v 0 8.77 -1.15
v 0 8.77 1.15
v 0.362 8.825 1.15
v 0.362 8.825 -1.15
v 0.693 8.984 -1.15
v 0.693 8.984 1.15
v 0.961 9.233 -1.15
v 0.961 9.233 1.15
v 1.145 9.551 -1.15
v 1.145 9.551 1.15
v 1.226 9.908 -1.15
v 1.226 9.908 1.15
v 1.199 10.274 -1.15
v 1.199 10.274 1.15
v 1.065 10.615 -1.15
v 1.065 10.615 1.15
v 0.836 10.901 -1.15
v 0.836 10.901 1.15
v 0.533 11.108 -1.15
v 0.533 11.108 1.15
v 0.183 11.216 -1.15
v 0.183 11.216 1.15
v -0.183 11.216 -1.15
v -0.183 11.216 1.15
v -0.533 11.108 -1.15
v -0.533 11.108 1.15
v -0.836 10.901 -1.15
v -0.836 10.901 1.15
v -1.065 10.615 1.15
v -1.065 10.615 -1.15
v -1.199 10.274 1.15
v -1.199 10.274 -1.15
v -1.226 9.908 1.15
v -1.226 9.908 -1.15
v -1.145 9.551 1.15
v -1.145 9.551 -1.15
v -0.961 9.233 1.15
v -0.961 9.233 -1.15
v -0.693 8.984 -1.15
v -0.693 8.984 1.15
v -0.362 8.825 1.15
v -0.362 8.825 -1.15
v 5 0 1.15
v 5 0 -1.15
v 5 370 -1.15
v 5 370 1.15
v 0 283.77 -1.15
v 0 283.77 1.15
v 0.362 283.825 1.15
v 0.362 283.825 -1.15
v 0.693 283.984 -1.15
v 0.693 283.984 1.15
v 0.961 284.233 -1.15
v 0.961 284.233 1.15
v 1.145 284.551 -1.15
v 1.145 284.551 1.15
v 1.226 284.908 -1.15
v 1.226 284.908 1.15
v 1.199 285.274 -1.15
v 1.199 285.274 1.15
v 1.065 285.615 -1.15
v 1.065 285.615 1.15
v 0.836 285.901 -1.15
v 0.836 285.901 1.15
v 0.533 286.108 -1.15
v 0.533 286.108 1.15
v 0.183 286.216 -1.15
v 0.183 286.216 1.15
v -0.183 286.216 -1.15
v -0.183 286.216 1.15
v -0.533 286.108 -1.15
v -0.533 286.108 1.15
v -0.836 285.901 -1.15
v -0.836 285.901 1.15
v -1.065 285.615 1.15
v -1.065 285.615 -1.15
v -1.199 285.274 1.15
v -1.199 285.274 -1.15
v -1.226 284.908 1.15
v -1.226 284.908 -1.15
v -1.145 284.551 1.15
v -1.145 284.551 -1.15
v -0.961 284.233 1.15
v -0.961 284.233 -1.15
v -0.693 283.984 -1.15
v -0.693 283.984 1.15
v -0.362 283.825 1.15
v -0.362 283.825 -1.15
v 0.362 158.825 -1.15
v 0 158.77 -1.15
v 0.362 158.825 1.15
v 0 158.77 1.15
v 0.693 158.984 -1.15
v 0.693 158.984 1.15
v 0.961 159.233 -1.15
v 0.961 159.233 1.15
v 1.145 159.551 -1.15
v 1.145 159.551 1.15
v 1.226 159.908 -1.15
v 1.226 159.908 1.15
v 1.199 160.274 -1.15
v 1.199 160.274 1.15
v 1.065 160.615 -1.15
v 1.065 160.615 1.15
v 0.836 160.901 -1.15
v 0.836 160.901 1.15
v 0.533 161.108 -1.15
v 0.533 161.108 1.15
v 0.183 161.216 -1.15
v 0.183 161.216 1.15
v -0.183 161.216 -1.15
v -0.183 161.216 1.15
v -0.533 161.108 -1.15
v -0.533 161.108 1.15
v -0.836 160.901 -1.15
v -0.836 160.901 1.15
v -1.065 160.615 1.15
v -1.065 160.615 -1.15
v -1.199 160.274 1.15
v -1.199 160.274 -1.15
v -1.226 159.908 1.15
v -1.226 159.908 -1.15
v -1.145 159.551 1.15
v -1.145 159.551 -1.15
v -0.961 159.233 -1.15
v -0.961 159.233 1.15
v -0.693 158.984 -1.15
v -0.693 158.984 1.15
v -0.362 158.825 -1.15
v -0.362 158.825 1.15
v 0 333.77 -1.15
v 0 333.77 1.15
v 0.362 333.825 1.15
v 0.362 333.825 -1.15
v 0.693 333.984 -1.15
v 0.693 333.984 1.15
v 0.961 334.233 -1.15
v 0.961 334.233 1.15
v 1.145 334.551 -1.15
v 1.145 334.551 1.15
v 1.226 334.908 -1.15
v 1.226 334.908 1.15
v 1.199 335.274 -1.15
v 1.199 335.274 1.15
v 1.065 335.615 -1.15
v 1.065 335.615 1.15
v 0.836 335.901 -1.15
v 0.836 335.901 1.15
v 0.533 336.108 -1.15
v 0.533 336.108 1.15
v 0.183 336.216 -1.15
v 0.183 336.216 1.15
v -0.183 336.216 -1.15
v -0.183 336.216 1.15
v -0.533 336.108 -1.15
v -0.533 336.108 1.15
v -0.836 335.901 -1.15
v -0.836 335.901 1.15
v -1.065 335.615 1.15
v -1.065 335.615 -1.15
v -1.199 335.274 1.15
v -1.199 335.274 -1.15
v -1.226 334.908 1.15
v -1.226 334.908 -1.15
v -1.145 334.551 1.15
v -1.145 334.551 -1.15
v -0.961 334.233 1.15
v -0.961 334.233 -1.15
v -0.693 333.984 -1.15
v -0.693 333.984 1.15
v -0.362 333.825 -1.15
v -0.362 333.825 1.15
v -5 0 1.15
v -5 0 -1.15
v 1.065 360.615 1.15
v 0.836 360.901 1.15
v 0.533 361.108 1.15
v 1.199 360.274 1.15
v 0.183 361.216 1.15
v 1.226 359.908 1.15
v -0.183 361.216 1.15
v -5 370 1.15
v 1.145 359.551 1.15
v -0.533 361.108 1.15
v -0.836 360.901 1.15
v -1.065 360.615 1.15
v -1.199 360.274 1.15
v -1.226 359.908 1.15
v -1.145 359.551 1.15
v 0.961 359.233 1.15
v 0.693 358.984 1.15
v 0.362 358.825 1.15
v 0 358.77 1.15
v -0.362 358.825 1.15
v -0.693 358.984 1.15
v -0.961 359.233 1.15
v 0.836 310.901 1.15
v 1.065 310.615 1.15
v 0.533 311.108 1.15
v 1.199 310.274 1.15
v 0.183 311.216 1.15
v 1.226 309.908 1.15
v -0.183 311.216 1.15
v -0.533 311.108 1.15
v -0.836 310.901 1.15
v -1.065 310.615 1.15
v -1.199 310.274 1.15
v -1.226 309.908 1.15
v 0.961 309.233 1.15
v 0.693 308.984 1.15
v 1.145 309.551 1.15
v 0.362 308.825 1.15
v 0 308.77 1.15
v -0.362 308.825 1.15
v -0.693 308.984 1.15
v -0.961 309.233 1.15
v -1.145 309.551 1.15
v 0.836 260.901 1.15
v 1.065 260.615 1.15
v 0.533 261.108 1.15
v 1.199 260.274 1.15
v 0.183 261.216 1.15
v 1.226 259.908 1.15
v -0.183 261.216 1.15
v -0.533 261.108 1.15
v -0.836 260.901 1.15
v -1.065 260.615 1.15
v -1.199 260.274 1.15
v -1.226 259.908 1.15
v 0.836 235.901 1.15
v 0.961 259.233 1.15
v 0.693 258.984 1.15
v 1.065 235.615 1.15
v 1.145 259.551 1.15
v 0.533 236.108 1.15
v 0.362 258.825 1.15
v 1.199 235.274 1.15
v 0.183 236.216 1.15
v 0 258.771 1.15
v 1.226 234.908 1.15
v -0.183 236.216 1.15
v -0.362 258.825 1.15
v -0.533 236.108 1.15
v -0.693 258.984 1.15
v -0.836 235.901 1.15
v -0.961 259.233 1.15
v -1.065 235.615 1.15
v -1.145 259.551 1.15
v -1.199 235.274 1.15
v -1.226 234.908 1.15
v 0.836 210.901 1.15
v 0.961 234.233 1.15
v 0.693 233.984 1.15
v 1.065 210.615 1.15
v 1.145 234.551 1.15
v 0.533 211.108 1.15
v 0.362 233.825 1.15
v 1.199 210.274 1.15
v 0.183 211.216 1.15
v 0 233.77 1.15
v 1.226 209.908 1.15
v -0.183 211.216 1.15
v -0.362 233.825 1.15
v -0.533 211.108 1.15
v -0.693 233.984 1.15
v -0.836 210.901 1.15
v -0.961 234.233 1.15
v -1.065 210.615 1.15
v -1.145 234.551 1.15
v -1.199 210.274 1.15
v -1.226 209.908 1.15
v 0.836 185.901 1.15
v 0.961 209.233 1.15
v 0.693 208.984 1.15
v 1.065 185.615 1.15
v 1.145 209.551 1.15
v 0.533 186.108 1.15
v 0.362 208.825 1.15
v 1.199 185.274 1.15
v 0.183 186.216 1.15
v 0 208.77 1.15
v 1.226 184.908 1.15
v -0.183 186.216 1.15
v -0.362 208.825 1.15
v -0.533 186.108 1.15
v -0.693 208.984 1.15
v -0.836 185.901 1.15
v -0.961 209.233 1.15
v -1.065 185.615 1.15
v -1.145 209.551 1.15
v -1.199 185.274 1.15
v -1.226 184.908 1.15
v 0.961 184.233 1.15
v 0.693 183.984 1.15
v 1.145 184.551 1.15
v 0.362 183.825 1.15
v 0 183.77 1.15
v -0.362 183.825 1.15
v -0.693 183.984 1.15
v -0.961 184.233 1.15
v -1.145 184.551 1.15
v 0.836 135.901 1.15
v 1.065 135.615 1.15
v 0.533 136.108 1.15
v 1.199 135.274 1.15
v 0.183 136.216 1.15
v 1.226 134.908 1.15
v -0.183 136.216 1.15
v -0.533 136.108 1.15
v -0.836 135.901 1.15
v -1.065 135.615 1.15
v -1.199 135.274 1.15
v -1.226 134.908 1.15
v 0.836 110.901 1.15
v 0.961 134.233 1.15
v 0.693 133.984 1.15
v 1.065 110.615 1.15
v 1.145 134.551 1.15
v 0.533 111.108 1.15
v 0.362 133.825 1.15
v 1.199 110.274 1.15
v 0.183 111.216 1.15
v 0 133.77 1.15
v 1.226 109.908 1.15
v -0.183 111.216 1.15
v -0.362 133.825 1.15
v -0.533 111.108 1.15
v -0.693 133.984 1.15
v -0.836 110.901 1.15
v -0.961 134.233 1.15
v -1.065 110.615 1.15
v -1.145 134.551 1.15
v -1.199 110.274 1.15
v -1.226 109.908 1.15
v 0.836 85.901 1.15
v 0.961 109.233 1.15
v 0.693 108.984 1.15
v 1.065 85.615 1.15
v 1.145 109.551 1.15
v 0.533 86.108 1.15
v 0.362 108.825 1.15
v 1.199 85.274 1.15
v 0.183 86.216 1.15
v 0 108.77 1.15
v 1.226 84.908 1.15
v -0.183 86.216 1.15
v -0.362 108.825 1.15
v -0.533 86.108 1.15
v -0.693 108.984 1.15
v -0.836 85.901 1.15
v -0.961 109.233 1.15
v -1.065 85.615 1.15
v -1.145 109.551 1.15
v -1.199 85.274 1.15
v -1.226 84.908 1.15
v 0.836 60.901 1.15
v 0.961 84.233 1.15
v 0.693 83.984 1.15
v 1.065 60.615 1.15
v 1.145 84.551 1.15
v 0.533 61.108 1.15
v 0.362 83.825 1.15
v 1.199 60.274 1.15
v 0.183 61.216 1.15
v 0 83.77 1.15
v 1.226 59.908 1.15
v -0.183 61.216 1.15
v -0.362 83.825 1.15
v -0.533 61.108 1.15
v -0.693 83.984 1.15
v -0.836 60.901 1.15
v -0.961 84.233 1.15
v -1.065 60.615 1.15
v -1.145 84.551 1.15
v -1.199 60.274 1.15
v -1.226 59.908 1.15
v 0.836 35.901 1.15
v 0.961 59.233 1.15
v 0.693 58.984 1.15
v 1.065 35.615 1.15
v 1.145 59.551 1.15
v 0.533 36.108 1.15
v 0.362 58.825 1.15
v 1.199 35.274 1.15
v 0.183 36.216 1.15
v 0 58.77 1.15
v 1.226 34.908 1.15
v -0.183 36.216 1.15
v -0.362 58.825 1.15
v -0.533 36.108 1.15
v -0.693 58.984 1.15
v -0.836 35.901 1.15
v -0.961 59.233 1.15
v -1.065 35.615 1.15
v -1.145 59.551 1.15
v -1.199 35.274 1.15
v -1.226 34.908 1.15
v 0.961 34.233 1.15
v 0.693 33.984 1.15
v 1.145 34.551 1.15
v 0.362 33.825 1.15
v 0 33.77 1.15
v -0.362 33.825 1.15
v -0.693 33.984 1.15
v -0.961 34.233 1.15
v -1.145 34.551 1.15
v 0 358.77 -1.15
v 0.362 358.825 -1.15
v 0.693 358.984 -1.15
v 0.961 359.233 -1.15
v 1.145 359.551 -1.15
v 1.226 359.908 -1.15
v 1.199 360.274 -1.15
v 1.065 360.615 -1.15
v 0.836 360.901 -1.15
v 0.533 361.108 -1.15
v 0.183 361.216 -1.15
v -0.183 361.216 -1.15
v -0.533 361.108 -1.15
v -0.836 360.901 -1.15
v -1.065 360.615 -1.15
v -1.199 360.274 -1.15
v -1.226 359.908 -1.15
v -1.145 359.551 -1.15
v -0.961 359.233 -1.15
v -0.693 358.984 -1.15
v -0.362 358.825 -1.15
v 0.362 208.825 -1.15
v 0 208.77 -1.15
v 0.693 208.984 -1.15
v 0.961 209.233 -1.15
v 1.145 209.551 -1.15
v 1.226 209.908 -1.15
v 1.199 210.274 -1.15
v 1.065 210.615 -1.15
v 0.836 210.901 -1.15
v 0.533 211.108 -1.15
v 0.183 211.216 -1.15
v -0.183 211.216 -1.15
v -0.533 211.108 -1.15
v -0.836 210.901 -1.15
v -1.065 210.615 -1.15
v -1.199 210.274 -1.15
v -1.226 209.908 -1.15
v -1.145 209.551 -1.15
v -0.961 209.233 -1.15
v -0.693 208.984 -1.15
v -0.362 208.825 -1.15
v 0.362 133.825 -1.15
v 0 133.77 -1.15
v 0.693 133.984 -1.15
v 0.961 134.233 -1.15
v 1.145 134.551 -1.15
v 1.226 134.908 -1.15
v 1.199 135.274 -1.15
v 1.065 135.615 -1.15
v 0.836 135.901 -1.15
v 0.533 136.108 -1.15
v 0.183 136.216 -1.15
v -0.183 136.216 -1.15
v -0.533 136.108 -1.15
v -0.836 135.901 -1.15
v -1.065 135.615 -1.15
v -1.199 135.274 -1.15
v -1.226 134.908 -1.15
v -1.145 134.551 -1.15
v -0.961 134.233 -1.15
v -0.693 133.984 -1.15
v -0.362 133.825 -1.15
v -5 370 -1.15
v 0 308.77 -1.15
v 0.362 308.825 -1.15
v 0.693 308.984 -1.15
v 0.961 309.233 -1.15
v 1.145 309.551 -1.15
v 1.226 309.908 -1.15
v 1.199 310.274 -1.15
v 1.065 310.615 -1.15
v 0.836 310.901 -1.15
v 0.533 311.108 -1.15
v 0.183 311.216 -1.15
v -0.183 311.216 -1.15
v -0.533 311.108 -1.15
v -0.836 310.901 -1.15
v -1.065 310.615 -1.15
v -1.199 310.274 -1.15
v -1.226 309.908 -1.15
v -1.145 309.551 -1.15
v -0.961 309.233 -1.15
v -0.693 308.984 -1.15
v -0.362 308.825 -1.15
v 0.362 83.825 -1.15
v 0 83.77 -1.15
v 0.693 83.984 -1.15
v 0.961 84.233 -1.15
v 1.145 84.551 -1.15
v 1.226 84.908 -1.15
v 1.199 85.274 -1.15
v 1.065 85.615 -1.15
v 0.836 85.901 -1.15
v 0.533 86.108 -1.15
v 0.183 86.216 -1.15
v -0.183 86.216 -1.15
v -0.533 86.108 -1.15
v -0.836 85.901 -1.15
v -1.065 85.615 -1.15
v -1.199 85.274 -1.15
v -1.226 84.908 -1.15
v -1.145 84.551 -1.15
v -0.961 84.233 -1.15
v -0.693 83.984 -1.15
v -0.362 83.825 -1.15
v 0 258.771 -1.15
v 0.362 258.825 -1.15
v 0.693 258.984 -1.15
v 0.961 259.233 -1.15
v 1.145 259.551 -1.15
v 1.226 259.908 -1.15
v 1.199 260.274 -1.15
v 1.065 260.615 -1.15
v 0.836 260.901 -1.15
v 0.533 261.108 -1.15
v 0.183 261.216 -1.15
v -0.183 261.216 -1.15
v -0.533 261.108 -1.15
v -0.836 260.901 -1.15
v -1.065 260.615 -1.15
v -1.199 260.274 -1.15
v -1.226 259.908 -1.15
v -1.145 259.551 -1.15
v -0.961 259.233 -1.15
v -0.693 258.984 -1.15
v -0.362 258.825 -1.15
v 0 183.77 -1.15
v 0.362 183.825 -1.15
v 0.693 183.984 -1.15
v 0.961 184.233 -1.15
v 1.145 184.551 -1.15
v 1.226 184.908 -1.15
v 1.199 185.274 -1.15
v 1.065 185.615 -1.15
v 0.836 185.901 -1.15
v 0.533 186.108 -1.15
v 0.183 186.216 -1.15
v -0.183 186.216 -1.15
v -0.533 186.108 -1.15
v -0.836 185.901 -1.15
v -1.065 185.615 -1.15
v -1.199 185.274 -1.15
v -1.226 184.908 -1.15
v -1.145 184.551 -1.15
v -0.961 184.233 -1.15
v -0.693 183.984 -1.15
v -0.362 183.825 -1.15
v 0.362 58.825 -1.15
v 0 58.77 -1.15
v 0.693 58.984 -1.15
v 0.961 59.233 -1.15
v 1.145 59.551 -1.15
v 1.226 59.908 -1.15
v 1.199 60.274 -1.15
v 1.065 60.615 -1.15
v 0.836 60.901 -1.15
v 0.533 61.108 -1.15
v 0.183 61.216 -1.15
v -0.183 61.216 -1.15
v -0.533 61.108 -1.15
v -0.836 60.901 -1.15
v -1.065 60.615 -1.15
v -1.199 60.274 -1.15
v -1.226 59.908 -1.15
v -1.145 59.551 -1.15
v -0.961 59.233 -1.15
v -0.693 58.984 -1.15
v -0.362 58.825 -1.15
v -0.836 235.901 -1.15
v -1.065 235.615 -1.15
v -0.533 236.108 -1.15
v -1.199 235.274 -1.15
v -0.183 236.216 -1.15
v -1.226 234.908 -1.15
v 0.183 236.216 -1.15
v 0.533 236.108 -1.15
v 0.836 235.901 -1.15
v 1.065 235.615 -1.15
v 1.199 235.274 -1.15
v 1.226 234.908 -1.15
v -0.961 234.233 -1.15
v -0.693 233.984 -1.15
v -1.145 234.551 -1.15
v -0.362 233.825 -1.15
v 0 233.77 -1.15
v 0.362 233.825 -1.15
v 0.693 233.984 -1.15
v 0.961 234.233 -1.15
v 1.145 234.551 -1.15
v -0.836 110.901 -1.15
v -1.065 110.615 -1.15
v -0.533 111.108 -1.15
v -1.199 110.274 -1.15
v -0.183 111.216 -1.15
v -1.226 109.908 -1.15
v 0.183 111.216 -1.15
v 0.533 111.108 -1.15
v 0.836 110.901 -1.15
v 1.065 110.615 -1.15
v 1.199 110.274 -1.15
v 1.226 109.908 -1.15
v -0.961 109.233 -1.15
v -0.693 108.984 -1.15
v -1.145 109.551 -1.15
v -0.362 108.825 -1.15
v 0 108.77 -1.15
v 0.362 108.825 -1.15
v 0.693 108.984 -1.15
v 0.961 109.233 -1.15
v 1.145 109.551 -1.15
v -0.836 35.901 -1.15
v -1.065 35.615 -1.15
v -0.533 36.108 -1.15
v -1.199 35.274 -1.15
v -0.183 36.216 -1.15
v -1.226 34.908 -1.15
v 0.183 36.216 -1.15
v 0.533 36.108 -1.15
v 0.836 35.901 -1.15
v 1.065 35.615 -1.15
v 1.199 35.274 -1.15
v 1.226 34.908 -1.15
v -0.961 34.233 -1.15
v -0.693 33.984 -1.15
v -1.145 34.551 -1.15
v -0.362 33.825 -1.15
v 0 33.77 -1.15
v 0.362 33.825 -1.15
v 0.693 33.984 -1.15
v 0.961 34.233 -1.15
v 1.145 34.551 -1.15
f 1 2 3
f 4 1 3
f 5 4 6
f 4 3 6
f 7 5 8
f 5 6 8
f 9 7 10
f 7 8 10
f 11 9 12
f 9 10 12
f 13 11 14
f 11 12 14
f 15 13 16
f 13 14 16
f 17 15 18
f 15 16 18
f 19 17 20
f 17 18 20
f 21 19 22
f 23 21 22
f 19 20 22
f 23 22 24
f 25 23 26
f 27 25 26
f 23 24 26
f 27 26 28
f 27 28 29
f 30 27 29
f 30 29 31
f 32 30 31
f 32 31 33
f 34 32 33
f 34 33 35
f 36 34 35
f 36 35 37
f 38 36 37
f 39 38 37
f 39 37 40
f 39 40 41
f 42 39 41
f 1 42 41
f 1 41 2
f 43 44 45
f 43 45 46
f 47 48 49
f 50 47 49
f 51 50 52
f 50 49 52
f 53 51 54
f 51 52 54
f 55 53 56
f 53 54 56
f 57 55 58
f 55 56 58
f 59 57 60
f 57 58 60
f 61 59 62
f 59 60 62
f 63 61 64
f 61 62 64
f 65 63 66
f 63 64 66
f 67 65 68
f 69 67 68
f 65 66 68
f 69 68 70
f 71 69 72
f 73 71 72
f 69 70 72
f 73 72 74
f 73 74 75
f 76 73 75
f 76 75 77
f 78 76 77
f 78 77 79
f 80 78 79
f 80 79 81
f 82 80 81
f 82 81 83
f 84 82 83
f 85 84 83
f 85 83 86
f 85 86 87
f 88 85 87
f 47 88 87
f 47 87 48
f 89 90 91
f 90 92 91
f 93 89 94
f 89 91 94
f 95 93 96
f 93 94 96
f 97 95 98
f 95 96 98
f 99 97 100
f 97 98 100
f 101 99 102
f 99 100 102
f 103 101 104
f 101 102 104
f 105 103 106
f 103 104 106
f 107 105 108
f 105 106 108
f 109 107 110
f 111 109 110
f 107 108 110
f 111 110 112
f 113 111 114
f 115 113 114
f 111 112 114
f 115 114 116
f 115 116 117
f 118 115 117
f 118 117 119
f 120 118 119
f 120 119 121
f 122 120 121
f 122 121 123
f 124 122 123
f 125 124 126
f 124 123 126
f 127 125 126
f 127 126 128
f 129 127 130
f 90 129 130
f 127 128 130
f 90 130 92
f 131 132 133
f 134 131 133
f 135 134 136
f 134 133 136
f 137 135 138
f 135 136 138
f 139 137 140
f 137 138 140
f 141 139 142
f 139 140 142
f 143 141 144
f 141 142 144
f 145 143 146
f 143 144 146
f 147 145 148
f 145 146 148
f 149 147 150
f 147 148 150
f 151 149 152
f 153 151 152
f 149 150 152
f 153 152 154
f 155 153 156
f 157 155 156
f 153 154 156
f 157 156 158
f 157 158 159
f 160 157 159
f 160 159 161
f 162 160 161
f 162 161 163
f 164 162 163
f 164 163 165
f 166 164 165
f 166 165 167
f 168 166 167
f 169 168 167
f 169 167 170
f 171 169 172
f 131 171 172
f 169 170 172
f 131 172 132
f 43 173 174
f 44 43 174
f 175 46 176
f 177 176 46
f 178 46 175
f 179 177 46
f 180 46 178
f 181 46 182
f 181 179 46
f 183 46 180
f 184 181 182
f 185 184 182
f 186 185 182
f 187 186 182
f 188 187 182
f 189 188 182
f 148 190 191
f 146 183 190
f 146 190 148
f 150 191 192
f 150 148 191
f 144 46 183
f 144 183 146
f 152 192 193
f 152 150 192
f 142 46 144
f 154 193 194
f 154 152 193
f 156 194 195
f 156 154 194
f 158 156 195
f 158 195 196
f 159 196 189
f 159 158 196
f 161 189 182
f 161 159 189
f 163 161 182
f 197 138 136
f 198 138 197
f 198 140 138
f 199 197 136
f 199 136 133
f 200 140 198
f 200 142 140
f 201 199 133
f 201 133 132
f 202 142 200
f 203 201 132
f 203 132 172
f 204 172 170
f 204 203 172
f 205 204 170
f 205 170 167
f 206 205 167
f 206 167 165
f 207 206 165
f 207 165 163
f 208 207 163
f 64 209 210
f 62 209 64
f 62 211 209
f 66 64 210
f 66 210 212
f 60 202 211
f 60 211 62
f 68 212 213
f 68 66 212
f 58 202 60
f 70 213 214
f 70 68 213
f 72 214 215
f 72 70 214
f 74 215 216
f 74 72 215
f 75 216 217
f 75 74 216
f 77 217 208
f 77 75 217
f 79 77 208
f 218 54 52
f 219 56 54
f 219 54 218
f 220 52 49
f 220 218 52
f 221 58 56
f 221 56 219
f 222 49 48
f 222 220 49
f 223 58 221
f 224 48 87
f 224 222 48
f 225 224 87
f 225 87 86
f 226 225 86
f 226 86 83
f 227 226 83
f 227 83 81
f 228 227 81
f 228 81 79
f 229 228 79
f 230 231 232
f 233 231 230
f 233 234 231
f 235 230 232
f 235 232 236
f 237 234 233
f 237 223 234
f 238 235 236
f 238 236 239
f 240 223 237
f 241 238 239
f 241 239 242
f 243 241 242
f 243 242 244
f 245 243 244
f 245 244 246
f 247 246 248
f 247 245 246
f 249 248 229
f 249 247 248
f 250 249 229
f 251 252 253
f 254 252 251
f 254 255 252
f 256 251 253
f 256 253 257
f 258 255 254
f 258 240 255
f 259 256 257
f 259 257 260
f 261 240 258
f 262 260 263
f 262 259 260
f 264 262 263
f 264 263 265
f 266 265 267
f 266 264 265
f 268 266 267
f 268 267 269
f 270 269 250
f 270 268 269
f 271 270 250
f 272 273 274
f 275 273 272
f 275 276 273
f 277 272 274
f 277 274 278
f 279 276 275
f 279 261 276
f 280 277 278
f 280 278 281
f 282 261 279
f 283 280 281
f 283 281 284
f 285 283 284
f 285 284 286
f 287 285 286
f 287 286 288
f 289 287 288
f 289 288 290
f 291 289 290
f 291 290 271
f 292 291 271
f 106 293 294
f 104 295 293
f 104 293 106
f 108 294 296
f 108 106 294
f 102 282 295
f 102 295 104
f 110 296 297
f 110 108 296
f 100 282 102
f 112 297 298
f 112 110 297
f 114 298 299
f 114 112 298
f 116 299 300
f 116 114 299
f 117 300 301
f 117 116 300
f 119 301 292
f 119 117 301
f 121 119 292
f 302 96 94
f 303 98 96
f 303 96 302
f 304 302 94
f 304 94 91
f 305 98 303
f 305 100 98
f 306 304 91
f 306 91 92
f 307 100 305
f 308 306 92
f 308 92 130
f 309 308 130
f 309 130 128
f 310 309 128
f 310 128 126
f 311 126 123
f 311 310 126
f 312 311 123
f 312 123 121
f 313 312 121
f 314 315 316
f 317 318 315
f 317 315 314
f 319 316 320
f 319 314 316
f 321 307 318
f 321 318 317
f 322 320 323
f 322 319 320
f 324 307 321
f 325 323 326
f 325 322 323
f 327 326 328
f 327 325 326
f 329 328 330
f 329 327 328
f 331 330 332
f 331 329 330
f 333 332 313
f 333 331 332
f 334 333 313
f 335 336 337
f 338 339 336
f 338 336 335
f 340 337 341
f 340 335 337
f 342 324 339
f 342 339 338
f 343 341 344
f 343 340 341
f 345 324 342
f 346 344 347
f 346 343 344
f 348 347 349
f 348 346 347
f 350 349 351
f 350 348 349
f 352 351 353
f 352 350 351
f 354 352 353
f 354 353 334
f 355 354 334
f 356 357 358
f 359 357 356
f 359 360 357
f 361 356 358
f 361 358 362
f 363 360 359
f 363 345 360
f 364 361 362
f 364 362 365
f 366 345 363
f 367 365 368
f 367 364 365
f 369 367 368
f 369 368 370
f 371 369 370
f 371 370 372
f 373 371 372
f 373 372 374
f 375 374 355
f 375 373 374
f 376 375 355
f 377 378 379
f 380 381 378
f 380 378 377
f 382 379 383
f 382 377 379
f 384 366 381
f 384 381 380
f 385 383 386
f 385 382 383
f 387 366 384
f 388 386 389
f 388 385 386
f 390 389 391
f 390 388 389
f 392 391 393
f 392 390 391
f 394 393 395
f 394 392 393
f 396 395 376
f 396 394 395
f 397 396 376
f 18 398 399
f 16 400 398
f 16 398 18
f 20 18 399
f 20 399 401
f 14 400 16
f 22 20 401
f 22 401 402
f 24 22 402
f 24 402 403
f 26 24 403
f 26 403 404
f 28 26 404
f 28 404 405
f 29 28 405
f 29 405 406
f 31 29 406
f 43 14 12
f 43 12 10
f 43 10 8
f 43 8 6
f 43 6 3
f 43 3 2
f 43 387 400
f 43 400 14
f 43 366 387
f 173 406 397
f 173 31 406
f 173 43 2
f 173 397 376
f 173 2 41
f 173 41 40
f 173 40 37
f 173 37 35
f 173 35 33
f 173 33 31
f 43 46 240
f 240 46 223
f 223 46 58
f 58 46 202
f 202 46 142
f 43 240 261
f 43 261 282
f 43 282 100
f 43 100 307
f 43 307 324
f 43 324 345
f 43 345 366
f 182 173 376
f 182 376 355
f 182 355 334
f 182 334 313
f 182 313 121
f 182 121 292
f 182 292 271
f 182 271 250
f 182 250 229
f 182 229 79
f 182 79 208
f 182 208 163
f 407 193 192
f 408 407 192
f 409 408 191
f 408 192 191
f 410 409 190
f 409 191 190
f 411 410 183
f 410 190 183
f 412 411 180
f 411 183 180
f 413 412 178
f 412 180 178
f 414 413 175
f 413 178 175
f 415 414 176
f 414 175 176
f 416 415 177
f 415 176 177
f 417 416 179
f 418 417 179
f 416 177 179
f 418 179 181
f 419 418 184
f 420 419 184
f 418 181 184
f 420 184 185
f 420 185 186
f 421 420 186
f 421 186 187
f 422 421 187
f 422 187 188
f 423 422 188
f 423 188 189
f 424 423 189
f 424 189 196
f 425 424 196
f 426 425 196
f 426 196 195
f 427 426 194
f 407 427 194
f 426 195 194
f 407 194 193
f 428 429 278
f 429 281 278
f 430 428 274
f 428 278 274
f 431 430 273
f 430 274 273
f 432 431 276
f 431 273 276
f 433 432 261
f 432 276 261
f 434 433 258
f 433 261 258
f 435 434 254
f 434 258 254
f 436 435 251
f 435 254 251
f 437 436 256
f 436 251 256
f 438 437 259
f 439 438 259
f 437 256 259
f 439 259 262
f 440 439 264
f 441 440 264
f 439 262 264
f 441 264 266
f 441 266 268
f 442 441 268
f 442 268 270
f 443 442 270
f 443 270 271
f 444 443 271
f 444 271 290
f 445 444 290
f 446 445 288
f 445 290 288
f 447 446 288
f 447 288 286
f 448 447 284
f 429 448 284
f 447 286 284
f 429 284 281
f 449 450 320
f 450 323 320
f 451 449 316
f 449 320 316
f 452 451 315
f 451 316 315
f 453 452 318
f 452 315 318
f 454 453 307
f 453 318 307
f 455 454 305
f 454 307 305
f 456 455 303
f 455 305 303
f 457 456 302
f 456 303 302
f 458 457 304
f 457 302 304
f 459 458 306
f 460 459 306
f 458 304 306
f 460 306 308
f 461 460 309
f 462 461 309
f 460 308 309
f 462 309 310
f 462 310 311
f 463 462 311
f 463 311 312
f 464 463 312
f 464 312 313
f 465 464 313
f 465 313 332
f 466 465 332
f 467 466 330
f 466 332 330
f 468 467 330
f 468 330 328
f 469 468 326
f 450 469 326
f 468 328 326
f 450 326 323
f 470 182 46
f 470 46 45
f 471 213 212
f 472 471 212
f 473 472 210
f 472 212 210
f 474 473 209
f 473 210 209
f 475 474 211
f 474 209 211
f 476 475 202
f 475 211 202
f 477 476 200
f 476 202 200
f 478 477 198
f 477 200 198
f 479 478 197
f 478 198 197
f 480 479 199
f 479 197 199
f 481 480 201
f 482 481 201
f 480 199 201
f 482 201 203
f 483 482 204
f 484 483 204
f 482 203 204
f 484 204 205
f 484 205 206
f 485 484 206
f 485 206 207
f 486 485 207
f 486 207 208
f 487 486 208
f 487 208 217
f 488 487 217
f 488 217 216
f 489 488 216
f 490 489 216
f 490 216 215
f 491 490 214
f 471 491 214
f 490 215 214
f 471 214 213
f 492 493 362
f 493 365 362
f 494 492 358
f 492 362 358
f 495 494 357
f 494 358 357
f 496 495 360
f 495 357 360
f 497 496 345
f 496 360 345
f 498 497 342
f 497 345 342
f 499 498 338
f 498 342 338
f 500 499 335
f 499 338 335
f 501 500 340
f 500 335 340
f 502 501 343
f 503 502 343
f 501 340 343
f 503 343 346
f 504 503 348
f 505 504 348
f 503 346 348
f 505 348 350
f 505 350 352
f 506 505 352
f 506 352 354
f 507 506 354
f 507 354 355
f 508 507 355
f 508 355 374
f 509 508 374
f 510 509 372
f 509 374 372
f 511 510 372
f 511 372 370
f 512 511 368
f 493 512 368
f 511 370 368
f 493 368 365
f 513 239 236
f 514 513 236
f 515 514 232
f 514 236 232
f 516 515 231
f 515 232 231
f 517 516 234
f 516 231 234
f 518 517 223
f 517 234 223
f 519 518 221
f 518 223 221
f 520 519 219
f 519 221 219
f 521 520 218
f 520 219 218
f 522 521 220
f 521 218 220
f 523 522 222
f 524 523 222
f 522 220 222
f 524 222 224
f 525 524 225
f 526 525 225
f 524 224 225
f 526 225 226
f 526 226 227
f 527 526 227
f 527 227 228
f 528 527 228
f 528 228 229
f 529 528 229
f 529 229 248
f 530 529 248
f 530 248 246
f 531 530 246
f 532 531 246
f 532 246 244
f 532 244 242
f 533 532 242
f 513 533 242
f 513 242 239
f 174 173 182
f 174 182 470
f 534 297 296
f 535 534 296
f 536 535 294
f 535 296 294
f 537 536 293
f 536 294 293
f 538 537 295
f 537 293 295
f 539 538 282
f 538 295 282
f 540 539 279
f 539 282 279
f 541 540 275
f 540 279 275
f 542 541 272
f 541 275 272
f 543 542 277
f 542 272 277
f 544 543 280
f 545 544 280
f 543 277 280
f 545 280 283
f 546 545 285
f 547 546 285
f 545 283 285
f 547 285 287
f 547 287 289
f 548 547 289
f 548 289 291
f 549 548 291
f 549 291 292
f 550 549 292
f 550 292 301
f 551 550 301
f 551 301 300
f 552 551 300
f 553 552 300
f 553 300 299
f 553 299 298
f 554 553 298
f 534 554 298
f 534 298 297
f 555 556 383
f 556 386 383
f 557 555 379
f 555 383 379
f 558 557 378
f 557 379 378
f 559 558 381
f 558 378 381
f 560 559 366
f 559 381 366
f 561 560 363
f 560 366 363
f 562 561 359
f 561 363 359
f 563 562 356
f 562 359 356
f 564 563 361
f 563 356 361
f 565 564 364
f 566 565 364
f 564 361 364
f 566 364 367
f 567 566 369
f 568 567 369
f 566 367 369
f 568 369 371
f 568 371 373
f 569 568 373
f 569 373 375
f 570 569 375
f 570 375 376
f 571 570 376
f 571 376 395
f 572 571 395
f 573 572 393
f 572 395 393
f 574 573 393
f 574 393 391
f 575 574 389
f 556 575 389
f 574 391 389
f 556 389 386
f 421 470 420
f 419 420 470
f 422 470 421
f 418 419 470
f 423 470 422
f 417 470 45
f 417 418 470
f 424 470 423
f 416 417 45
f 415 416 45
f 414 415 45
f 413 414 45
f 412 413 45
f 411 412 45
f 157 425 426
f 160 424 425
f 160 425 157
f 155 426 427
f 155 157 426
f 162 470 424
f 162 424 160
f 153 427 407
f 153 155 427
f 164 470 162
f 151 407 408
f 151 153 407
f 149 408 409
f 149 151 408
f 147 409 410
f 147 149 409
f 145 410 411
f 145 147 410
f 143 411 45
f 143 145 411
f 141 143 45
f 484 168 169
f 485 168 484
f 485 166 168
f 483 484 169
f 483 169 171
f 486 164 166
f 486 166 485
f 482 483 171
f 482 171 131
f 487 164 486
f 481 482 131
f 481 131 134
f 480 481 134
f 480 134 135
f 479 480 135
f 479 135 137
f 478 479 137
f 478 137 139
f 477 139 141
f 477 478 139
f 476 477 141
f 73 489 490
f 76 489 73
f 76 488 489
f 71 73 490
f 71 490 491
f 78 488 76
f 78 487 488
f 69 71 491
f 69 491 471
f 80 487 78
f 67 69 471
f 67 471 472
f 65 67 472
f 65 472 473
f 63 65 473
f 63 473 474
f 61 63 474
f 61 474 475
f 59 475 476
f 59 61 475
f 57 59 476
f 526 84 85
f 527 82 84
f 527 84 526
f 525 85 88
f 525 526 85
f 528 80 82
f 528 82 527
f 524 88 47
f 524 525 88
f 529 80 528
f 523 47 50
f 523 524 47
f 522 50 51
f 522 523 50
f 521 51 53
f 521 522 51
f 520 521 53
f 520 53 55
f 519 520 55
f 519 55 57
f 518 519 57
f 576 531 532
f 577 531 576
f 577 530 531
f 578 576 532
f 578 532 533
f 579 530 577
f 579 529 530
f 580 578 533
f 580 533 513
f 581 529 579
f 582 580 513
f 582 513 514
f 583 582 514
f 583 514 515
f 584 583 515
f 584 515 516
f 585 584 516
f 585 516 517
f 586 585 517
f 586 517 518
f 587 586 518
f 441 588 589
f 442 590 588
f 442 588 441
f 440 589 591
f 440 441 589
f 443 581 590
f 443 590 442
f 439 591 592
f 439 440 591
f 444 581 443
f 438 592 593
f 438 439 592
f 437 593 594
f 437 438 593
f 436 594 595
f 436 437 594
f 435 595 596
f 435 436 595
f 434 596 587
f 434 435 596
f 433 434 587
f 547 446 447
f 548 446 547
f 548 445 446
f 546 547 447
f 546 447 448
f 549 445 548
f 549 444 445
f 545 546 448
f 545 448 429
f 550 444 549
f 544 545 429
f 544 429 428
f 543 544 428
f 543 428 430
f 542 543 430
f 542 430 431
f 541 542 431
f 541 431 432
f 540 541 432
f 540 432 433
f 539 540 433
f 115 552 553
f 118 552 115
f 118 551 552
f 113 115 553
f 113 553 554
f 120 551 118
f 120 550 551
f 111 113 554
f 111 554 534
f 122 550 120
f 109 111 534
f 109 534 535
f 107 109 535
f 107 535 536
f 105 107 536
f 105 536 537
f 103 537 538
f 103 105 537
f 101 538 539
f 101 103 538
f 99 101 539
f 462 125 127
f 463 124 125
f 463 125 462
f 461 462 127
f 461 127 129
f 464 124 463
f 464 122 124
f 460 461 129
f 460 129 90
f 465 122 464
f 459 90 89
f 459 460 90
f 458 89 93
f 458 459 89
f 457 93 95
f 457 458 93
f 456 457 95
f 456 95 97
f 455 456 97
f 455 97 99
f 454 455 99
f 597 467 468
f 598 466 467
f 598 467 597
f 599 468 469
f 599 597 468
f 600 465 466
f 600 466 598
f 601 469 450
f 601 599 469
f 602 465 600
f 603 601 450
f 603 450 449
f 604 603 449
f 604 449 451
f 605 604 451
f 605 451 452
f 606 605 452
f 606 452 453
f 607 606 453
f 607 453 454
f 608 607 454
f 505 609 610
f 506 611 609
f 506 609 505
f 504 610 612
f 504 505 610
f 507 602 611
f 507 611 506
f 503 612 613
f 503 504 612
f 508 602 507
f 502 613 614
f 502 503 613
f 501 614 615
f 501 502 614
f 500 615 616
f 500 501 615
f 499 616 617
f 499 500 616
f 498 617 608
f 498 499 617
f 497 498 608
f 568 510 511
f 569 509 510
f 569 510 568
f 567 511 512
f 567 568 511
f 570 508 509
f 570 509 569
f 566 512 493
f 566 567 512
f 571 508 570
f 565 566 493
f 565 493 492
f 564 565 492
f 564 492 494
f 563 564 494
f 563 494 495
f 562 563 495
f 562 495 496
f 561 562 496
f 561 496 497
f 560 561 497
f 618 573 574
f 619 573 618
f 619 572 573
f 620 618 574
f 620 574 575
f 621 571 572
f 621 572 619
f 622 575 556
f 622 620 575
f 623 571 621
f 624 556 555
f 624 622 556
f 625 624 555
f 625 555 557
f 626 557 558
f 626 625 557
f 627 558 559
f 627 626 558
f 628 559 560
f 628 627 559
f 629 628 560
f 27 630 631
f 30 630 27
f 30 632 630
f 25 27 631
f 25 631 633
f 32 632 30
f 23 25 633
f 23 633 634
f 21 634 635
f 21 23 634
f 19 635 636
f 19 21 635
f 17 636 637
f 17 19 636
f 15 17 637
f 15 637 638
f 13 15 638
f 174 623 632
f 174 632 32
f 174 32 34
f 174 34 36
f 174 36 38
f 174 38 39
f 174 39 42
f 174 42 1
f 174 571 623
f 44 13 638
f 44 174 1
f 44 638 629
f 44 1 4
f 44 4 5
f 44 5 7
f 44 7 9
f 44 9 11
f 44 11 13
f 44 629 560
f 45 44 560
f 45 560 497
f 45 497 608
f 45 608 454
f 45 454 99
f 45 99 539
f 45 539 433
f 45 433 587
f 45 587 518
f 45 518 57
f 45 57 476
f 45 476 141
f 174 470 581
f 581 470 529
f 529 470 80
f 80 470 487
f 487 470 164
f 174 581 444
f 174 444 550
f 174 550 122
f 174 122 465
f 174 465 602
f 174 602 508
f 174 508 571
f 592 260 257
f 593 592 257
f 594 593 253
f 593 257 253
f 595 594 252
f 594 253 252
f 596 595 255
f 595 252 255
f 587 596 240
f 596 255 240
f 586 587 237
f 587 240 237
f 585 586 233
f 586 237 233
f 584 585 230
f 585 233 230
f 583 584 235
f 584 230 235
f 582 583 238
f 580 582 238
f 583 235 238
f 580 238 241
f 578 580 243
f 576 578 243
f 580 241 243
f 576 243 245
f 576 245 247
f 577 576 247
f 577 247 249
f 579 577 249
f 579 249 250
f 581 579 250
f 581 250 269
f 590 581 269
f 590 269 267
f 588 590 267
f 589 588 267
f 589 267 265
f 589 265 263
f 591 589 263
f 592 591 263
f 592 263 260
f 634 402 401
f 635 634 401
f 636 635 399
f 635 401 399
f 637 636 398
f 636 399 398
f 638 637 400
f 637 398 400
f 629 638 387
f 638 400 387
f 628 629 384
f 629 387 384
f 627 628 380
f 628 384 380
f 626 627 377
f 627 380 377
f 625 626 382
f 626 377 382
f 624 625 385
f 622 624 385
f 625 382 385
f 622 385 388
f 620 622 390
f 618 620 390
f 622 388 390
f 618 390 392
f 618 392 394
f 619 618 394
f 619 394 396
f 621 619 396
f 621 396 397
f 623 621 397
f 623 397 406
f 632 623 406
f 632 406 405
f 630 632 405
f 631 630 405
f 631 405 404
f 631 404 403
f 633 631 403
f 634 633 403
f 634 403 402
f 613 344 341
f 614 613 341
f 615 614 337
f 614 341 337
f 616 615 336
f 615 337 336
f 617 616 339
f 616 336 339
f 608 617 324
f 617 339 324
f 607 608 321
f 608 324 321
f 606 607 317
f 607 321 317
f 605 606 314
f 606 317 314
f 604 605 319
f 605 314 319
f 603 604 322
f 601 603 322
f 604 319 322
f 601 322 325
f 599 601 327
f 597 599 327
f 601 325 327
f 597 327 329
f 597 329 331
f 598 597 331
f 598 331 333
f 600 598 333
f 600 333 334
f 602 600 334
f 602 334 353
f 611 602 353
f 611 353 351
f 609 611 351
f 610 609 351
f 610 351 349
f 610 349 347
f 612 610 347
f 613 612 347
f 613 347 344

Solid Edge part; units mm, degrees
sketch "Sketch1" plane through (0, 0, 0) normal (0, -1, 0) x (1, 0, 0)
  line L0 (-5, -1.15) -> (5, -1.15)
  line L1 (5, -1.15) -> (5, 1.15)
  line L2 (5, 1.15) -> (-5, 1.15)
  line L3 (-5, 1.15) -> (-5, -1.15)
  dimension "D1" = 10
  dimension "D2" = 2.3
extrude "Protrusion1" add sketch "Sketch1" against normal blind 370
hole "Hole_1" at (0, 10, 1.15) direction (0, 0, -1) diameter 2.459 end up to next
pattern_linear "Pattern1" count 15 spacing 25 along (0, 1, 0) of "Hole_1"
properties material "Stainless Steel, 304"
